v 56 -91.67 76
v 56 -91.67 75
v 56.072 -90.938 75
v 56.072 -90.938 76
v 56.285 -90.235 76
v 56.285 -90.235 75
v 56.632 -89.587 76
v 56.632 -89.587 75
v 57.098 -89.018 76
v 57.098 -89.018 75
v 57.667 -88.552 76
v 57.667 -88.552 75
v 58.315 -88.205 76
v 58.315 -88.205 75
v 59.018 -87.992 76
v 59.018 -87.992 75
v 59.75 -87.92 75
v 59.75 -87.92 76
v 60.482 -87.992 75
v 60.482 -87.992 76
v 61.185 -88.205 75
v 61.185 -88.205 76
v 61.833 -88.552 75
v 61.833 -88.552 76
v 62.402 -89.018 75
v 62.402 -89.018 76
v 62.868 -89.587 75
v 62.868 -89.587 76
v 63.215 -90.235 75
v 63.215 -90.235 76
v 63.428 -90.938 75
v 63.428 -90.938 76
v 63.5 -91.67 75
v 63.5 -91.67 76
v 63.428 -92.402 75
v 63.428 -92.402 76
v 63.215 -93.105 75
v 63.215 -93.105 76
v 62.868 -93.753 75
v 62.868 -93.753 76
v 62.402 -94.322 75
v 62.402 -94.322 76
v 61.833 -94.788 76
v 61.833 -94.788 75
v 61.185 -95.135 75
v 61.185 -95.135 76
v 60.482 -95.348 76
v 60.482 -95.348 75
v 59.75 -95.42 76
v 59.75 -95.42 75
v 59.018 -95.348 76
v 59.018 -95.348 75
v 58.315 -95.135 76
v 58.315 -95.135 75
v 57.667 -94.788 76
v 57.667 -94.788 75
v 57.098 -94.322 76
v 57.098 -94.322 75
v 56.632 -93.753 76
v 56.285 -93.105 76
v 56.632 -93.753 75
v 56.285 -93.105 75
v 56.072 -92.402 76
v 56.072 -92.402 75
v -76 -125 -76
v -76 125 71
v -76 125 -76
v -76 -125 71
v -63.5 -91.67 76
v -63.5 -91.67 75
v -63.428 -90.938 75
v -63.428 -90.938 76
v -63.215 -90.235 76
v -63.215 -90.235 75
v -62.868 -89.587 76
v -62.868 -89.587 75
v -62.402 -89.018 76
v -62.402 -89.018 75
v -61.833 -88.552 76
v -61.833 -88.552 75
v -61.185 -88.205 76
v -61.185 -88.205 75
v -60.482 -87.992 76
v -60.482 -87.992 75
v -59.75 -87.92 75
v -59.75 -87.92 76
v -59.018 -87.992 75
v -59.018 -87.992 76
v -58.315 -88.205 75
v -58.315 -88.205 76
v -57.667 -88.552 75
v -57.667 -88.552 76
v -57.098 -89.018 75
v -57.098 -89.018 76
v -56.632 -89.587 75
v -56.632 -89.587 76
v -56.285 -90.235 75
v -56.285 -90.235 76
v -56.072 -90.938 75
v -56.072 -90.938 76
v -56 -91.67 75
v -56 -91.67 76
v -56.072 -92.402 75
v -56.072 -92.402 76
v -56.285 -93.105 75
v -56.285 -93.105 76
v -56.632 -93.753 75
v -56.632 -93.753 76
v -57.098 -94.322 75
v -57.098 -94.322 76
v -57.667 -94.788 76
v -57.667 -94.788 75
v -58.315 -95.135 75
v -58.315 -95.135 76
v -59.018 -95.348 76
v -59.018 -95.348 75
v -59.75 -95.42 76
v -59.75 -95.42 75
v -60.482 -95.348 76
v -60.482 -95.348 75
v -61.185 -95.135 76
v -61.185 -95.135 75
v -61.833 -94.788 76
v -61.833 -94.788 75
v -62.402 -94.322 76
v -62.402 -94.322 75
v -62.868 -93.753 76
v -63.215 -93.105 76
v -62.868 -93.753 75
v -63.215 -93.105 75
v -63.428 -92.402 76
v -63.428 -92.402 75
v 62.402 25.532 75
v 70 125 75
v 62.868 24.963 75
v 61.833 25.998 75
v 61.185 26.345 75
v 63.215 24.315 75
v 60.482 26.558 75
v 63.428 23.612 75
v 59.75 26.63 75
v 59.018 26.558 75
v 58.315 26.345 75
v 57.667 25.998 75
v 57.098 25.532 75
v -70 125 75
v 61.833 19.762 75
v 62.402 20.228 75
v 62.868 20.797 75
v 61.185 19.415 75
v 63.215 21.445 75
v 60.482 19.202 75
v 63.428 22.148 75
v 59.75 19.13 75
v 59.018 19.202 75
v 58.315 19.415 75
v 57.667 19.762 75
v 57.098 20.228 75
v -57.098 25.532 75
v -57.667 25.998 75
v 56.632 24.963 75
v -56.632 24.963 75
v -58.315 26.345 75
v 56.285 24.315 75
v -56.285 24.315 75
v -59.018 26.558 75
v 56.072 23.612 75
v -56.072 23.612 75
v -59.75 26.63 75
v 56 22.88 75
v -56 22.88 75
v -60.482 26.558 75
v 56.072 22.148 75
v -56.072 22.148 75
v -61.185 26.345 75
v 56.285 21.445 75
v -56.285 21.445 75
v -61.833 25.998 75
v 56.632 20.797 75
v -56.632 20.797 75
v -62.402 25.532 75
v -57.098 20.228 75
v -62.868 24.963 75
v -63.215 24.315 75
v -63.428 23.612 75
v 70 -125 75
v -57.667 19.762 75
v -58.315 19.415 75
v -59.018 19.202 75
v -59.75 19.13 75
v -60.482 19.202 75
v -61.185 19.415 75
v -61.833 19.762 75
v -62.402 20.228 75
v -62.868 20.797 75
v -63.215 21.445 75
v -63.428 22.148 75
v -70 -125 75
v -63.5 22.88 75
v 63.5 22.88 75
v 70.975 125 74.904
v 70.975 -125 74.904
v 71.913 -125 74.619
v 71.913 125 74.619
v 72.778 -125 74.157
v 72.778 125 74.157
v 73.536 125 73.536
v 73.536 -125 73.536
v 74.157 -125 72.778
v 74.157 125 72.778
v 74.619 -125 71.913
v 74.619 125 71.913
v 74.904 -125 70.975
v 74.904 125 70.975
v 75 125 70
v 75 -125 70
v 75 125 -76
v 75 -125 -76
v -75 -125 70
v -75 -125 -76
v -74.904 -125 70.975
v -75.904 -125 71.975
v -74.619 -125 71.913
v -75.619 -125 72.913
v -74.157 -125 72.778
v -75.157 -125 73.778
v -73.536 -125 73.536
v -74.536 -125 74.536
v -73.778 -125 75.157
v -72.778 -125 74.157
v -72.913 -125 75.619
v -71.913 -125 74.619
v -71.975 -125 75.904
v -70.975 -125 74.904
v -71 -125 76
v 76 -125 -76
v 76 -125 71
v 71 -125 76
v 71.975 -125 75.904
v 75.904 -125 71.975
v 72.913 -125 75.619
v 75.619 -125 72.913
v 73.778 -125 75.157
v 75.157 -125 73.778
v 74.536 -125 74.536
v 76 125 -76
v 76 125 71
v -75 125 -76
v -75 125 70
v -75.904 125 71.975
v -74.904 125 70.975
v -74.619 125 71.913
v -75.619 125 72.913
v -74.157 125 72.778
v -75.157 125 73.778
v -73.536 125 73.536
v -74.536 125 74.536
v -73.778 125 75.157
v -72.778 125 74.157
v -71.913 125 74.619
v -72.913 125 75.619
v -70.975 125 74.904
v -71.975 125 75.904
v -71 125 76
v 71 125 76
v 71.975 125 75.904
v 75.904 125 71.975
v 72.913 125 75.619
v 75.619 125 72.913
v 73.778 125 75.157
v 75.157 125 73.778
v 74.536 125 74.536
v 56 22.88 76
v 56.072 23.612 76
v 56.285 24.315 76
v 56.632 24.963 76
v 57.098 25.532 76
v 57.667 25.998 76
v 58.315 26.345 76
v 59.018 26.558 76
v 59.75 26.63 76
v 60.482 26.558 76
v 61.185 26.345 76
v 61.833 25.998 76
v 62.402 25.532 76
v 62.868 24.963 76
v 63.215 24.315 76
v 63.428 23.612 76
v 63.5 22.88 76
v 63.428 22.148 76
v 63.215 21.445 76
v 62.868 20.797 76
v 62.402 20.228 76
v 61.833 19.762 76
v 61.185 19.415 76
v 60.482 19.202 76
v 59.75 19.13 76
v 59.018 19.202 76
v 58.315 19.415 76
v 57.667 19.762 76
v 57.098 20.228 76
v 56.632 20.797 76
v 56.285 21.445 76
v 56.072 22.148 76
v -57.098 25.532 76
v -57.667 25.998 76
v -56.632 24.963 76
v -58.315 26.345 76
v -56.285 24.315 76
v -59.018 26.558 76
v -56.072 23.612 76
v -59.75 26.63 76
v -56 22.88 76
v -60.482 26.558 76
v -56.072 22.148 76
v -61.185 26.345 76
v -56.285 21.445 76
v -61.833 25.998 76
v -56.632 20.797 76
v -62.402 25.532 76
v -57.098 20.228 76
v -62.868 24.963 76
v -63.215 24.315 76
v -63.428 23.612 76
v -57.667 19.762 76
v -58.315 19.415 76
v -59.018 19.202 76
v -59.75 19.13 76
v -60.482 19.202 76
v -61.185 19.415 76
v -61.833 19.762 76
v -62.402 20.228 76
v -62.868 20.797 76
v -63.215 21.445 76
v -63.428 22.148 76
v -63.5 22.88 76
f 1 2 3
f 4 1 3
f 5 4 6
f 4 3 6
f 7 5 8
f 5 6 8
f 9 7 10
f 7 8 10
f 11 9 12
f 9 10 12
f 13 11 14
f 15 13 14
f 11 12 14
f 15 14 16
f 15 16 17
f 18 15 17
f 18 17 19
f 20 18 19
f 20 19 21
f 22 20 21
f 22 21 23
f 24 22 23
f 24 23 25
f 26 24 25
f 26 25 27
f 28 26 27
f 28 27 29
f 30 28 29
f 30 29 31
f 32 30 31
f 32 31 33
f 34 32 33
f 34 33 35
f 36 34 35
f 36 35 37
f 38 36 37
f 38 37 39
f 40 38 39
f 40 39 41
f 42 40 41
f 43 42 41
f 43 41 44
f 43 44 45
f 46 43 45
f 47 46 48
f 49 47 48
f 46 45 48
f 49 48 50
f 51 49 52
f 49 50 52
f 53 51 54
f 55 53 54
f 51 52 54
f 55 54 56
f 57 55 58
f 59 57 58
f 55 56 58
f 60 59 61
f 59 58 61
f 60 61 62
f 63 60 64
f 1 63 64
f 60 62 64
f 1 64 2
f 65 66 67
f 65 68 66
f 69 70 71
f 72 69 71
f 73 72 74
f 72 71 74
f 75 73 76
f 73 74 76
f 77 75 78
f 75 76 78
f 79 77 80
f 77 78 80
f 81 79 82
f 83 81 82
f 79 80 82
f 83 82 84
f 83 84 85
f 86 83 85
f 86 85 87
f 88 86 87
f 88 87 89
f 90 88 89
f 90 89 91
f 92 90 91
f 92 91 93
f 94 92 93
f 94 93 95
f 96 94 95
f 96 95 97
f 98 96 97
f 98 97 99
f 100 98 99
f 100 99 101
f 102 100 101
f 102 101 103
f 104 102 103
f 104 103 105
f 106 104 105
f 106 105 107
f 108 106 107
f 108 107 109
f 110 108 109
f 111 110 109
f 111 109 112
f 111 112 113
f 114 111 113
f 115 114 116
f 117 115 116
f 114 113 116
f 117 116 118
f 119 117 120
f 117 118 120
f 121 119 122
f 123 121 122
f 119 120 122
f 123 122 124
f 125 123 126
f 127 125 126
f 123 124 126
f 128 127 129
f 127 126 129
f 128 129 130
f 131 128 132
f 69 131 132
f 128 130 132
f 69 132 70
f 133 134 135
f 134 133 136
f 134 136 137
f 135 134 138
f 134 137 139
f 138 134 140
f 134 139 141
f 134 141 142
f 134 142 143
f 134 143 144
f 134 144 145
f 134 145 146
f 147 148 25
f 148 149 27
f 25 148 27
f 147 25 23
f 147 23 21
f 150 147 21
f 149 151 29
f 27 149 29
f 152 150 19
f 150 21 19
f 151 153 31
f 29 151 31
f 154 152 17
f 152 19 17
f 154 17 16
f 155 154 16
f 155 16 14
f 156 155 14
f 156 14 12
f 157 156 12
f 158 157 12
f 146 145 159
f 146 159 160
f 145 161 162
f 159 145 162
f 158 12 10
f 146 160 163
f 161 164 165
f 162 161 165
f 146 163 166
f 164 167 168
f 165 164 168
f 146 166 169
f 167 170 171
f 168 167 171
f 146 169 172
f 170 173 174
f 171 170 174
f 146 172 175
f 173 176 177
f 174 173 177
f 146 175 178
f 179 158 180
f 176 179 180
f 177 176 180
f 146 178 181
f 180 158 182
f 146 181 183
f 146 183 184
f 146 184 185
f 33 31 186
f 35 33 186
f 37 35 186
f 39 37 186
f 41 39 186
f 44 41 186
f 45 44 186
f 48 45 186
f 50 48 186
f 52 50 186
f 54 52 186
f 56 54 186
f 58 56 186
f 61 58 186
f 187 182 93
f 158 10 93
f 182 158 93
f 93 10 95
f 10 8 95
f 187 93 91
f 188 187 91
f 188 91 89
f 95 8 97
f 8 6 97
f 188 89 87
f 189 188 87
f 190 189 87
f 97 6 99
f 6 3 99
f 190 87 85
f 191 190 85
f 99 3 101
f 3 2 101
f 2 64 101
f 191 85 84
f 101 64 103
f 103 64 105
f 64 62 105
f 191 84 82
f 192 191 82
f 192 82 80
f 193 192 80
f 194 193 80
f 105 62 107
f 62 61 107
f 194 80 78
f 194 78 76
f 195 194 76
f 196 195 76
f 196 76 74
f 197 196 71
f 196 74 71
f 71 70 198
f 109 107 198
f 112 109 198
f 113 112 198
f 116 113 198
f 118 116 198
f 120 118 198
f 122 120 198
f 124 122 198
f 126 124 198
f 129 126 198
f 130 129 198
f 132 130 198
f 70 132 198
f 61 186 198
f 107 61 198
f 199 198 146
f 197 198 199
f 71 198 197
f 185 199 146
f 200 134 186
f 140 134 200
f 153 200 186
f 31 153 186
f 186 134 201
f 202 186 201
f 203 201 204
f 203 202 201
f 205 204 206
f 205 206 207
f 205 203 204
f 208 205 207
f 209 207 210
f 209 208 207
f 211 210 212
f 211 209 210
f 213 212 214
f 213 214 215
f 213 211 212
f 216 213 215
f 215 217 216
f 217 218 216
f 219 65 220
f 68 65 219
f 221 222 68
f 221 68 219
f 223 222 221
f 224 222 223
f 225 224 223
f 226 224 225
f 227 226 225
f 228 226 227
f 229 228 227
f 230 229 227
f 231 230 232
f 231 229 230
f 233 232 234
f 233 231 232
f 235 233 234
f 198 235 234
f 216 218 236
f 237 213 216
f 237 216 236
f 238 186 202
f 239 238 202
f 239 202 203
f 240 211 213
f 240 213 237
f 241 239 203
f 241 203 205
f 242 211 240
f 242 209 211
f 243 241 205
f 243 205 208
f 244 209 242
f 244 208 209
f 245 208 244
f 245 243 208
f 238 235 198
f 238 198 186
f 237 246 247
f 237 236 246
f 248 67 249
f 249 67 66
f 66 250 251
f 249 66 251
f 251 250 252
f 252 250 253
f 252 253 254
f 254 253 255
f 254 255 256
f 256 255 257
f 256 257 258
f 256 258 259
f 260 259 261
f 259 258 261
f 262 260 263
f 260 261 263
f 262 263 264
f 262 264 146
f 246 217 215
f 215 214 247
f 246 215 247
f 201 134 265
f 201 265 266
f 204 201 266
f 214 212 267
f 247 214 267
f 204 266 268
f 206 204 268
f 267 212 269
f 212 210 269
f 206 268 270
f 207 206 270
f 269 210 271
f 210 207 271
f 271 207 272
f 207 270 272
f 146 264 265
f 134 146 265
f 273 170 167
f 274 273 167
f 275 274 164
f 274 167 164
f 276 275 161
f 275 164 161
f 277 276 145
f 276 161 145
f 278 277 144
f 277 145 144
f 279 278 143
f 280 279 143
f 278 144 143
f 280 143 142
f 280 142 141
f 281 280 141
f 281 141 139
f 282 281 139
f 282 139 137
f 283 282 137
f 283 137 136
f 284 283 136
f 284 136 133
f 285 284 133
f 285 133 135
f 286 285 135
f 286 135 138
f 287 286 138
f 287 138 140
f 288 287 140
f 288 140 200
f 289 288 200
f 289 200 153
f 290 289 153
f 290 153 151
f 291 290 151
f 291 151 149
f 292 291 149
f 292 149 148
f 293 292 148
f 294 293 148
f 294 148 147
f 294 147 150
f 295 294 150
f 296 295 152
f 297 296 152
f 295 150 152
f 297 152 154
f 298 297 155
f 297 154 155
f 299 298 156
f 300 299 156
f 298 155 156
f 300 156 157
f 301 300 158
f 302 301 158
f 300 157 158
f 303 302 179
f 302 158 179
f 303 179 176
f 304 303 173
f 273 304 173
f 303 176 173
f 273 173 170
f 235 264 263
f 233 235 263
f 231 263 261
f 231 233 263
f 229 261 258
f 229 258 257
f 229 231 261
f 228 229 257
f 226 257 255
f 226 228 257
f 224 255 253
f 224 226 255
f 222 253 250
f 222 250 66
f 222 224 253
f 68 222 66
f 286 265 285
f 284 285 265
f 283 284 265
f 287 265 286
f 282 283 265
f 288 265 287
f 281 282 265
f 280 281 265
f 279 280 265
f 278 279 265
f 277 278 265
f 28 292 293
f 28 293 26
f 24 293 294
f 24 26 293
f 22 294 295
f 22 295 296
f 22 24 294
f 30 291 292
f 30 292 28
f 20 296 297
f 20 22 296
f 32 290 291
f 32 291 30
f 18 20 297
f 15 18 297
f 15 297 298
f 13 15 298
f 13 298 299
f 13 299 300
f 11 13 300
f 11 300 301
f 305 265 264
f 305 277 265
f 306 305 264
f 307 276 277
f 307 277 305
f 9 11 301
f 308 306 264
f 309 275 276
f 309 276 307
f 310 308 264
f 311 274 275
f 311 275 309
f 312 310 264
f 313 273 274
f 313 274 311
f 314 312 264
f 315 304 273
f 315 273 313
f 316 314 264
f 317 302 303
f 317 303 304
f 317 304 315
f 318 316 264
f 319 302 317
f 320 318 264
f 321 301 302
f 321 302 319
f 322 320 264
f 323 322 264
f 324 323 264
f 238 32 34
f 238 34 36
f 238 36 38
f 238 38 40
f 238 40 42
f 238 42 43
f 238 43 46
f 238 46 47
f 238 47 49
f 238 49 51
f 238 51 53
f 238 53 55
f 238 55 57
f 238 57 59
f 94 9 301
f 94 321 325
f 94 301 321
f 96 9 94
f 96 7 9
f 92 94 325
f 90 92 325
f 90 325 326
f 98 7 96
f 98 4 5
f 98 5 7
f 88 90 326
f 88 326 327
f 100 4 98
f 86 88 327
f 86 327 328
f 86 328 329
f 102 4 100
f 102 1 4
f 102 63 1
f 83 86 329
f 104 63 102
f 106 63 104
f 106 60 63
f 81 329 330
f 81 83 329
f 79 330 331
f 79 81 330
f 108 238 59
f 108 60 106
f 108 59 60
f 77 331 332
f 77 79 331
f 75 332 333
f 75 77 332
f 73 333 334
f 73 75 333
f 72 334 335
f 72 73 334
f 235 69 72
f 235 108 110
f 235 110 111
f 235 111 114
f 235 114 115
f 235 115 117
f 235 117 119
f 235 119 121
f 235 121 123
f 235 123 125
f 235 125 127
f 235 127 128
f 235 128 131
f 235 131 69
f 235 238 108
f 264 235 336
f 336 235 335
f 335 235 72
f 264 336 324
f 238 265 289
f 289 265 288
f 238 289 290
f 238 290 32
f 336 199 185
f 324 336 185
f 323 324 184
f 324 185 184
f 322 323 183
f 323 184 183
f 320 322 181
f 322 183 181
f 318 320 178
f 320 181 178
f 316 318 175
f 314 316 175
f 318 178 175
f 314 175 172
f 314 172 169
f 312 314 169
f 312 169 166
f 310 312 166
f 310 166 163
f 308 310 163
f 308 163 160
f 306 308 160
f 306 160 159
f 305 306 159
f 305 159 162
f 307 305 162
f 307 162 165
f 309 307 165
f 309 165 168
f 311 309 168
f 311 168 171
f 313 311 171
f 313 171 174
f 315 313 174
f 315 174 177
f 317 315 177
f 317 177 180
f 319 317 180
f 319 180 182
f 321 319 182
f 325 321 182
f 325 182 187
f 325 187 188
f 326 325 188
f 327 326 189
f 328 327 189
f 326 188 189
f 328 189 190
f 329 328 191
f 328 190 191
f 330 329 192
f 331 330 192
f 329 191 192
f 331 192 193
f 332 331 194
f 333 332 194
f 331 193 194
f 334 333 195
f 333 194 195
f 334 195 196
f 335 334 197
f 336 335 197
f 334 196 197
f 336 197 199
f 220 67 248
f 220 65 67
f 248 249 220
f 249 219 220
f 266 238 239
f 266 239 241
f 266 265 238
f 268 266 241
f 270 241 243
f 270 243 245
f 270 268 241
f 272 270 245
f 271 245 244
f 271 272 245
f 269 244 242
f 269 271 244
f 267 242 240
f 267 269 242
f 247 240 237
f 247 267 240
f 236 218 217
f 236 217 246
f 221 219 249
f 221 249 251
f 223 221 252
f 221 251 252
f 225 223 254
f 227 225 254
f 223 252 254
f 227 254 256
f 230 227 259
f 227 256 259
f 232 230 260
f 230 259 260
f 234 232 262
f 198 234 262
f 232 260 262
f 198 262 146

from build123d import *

# Parameters (mm, degrees)
F1_DEPTH = 125
F2_T     = -1
F4_D     = 7.5
F5_R     = 5


with BuildPart() as f1:
    # F0 (on Front) → F1 (new body, symmetric)
    with BuildSketch(Plane.XZ):
        Polygon((76, 76), (0, 76), (-76, 76), (-76, 0), (-76, -76), (0, -76), (76, -76), (76, 0), align=None)
    extrude(amount=F1_DEPTH, both=True)

    # F2
    f2_openings = [f1.faces().sort_by_distance(p)[0] for p in [
        (0, -125, 0),
        (0, 0, -76),
        (0, 125, 0),
    ]]
    offset(amount=F2_T, openings=f2_openings)

    # F4 (through all)
    with Locations(Plane.XY.offset(76)):
        with Locations((-59.75, 22.88), (59.75, 22.88), (59.75, -91.67), (-59.75, -91.67)):
            Hole(F4_D / 2)

    # F5
    f5_edges = [f1.edges().sort_by_distance(p)[0] for p in [
        (-75, 0, 75),
        (75, 0, 75),
        (76, 0, 76),
        (-76, 0, 76),
    ]]
    fillet(f5_edges, radius=F5_R)


solid = f1.part
